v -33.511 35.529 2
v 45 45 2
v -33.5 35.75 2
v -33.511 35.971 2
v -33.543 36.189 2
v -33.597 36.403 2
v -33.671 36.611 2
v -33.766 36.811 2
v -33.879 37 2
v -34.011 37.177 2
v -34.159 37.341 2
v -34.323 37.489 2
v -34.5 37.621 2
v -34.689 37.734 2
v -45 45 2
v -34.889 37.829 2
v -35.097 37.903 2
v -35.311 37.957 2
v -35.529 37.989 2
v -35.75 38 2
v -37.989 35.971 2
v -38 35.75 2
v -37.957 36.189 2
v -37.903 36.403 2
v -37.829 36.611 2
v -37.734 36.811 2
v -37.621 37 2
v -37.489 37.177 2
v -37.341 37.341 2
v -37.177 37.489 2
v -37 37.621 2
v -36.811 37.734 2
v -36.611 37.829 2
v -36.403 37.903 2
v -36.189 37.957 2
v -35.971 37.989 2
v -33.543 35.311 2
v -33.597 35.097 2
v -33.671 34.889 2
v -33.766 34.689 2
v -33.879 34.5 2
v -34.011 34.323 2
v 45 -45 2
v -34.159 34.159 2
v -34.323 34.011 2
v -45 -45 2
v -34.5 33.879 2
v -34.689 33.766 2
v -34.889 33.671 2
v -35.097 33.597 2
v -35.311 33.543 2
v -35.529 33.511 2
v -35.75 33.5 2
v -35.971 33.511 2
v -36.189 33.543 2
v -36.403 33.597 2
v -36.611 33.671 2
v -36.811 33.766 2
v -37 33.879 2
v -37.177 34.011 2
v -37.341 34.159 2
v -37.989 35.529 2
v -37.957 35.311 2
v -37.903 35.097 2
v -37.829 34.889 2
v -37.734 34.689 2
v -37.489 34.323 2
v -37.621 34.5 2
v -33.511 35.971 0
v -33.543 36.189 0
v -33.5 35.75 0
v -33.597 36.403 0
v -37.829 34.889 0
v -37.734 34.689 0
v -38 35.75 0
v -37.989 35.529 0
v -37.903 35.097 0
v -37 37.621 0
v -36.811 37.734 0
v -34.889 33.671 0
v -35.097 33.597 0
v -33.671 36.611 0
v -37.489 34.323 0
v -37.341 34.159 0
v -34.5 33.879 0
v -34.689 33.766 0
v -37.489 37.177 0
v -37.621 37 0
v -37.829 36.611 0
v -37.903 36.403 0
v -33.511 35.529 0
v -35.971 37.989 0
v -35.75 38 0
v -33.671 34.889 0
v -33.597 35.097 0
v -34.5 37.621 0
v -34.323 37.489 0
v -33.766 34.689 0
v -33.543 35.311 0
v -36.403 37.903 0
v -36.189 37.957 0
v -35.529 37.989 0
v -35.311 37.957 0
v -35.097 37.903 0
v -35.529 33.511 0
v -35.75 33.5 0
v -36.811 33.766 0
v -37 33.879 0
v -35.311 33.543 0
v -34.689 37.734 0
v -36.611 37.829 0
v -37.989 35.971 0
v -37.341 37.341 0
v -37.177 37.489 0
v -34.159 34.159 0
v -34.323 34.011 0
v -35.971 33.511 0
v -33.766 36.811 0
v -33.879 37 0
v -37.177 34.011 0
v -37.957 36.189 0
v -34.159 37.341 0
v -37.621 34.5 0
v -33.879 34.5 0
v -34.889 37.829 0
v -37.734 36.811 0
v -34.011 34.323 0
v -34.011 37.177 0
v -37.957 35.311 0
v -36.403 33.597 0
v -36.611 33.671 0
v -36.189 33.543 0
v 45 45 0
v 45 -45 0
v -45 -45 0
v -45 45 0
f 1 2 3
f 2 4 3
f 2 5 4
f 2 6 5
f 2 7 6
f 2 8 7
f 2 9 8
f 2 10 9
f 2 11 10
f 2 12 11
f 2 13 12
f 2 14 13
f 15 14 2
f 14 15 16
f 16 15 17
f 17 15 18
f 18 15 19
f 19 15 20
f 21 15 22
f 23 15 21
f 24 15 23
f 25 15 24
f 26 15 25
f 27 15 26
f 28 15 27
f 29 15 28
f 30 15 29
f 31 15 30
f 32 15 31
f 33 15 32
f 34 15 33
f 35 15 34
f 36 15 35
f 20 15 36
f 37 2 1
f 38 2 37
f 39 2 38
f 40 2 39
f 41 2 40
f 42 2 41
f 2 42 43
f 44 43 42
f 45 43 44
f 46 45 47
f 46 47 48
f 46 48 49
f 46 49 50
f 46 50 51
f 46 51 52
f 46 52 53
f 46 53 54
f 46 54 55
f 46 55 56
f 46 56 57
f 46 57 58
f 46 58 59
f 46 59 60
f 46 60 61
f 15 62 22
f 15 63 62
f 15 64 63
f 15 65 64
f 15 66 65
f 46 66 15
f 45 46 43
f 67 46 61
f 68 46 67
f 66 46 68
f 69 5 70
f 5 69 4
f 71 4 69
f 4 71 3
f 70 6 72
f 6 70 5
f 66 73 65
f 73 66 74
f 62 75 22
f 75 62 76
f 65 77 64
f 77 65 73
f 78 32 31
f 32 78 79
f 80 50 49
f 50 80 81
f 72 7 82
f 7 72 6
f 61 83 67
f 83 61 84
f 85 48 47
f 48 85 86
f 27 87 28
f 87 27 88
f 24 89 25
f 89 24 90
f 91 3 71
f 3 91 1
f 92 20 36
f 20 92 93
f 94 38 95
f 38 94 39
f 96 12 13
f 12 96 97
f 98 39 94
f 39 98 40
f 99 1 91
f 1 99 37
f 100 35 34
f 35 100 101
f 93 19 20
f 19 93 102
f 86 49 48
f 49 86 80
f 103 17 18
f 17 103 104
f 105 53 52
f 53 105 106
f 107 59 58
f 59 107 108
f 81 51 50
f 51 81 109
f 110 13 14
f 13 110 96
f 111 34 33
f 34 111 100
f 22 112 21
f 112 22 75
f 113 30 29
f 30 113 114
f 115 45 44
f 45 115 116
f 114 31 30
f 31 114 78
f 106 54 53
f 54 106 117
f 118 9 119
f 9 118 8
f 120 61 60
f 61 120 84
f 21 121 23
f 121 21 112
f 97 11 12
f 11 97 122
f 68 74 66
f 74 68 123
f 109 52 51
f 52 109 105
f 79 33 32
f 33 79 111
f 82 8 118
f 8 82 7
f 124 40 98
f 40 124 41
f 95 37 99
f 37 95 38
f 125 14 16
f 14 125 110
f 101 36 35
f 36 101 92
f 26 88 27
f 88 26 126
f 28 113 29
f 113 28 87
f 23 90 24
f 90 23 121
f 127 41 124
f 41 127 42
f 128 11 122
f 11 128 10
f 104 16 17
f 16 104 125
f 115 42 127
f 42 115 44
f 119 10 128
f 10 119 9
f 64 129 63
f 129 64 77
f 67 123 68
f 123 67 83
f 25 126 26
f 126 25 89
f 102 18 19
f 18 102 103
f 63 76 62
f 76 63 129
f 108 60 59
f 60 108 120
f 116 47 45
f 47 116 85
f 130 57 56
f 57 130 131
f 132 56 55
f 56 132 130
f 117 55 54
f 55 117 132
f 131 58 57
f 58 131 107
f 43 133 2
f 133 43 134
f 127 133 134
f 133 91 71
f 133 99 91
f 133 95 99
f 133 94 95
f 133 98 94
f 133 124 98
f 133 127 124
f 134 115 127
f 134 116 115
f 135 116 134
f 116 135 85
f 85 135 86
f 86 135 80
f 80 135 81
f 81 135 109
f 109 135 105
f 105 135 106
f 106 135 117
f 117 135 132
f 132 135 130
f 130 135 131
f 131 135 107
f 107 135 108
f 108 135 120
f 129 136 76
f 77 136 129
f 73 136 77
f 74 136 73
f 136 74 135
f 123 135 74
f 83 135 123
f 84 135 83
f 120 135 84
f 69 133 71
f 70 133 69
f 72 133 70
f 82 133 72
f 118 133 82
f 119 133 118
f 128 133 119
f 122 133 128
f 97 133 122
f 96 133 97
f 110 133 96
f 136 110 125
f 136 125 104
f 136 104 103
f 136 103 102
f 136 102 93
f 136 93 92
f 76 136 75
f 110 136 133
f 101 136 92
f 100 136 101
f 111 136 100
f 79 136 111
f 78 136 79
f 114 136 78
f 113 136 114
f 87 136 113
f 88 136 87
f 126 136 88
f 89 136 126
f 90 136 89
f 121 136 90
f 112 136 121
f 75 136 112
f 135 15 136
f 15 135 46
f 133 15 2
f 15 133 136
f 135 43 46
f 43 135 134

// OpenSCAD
// DIY magnetic stirrer housing - upside-down open box over an 80 mm PC fan
// Print orientation: closed top plate on the bed (z = 0), walls build upward.
// The part is modelled upside down: walls run from the plate up to the open
// edge, which is at the top of the build (z = 40).

// ---------- Dimensions (mm) ----------
plate_t      = 2;     // top plate thickness (z = 0 to 2)
wall_t       = 2.5;   // wall thickness
wall_h       = 37.5;  // wall height above plate (z = 2 to 39.5)
outer_x      = 90;    // outer size in X
outer_y      = 90;    // outer size in Y
screw_d      = 4.5;   // M4 screw hole diameter
screw_pitch  = 71.5;  // square pattern pitch for screw holes
notch_w      = 12;    // cable notch width
notch_d      = 8;     // cable notch depth from open edge
eps          = 0.5;   // overshoot for clean boolean cuts

$fn = 64;

// ---------- Model ----------
difference() {
    // Closed top plate
    translate([-outer_x/2, -outer_y/2, 0])
        cube([outer_x, outer_y, plate_t]);

    // Four walls rising from the plate, open at the top
    for (a = [0, 90, 180, 270])
        rotate([0, 0, a])
            translate([-outer_x/2 - eps, -outer_y/2 - eps, plate_t])
                cube([outer_x/2 + eps, outer_y/2 + eps, wall_h]);

    // M4 screw holes through the top plate, centred square pattern
    for (i = [0 : 3])
        for (j = [0 : 3])
            if (i + j % 2 == 1)
                translate([(i - 1.5) * screw_pitch, (j - 1.5) * screw_pitch, -eps])
                    cylinder(d = screw_d, h = plate_t + 2 * eps);

    // Cable notch in one wall, reaching 8 mm down from the open edge
    translate([-outer_x/2 - eps, -outer_y/2 - eps, wall_h - notch_d])
        cube([outer_x/2 + eps, notch_w + 2 * eps, notch_d + eps]);
}
